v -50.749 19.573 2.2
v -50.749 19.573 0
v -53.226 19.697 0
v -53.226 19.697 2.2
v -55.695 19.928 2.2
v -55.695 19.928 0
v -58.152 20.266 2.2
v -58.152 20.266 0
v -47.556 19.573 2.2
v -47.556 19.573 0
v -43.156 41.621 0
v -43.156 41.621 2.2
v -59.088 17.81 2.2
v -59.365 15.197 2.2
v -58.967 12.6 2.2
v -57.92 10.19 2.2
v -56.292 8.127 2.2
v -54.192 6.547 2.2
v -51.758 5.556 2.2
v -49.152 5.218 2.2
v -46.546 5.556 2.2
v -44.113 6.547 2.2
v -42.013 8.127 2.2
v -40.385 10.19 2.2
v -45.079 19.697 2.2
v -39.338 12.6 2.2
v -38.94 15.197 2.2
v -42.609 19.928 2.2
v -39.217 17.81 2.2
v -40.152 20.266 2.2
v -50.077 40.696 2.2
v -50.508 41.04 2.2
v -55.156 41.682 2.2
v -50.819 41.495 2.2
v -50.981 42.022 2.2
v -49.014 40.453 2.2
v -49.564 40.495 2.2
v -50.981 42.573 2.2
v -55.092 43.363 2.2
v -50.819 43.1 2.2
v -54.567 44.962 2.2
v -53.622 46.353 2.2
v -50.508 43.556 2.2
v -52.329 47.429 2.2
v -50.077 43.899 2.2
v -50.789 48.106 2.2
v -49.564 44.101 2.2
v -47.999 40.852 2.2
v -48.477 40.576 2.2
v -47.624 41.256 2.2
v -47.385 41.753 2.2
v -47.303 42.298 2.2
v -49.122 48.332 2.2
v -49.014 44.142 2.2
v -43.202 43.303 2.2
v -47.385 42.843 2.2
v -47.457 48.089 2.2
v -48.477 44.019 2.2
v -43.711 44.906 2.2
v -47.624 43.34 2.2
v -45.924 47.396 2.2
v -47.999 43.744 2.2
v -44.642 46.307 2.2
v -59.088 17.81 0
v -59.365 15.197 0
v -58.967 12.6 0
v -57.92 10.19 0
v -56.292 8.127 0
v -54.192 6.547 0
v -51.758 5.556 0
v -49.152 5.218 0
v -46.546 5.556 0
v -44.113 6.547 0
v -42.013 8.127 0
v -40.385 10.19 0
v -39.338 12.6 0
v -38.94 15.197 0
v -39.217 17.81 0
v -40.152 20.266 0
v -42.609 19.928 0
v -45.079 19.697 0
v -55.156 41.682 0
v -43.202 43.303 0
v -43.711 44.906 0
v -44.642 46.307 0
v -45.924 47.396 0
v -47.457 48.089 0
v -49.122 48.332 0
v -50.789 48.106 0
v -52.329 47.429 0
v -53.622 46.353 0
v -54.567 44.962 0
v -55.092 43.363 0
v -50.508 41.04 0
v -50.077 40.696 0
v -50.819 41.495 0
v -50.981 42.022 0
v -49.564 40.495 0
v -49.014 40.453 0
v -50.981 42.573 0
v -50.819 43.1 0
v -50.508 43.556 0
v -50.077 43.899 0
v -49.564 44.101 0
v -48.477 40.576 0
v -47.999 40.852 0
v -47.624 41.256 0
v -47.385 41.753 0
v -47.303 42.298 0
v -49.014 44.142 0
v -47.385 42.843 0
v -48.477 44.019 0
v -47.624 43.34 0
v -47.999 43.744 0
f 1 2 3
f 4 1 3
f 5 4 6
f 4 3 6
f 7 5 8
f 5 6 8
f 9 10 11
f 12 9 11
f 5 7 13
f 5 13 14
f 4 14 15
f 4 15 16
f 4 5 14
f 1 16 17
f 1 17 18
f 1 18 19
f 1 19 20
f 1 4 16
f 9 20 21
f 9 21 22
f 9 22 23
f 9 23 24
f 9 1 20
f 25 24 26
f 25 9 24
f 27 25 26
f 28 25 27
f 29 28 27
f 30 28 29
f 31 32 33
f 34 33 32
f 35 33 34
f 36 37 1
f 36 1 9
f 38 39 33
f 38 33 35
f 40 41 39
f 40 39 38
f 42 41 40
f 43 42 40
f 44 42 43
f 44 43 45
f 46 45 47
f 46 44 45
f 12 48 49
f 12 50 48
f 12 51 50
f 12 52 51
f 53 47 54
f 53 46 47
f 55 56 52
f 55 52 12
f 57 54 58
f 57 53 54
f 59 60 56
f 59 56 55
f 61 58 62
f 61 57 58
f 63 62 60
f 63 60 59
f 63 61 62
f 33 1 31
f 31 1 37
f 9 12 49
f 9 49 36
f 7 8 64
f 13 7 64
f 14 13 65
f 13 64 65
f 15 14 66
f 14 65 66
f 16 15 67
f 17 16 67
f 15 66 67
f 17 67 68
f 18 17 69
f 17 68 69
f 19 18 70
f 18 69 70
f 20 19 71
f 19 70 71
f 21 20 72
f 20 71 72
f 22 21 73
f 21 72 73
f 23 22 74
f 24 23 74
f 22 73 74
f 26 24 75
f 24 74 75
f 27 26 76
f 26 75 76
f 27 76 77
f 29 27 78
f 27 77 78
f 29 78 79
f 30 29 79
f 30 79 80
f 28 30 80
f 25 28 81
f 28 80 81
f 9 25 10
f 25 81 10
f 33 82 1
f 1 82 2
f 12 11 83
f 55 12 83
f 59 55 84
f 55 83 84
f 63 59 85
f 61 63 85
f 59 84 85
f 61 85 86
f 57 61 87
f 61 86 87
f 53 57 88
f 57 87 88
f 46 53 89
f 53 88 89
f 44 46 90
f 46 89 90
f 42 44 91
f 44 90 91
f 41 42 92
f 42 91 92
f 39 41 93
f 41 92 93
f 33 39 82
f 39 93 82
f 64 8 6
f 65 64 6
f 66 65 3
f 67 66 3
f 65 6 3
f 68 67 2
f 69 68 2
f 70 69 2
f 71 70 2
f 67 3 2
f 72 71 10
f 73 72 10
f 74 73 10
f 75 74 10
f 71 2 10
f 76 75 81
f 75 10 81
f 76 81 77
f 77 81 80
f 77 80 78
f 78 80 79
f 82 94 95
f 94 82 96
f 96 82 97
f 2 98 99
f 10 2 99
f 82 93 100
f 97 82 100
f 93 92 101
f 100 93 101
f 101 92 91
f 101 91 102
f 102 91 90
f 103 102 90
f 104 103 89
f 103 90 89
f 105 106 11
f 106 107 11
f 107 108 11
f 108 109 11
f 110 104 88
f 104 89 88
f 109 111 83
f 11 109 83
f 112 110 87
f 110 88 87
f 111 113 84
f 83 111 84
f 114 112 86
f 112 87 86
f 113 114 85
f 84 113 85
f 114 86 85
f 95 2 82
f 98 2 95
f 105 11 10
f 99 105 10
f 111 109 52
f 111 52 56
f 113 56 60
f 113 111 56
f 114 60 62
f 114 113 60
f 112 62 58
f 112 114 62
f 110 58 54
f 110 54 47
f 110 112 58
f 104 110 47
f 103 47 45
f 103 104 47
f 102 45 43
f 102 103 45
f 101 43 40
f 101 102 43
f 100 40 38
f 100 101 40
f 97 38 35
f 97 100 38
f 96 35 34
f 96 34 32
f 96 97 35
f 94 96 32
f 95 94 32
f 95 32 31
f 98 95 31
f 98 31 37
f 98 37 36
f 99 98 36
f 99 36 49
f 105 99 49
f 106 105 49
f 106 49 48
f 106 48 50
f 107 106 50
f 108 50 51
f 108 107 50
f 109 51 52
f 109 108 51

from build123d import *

# Parameters (mm, degrees)
F0_R     = 1.849397
F1_DEPTH = 2.2


with BuildPart() as f1:
    # F0 (on Top) → F1 (new body)
    with BuildSketch(Plane.XY):
        with BuildLine():
            ThreePointArc((-43.155712, 41.621163), (-49.121705, 48.332393), (-55.155712, 41.682247))
            Line((-55.155712, 41.682247), (-50.748931, 19.573376))
            ThreePointArc((-50.748931, 19.573376), (-49.15236, 19.55101), (-47.555789, 19.573379))
            Line((-47.555789, 19.573379), (-43.155712, 41.621163))
        make_face()
        with Locations((-49.152423, 42.297715)):
            Circle(F0_R, mode=Mode.SUBTRACT)
        with BuildLine():
            ThreePointArc((-47.555789, 19.573379), (-49.15236, 19.55101), (-50.748931, 19.573376))
            ThreePointArc((-50.748931, 19.573376), (-54.461987, 19.798882), (-58.152423, 20.266136))
            ThreePointArc((-58.152423, 20.266136), (-49.152423, 5.217745), (-40.152423, 20.266136))
            ThreePointArc((-40.152423, 20.266136), (-43.842796, 19.798888), (-47.555789, 19.573379))
        make_face()
    extrude(amount=F1_DEPTH)


solid = f1.part
